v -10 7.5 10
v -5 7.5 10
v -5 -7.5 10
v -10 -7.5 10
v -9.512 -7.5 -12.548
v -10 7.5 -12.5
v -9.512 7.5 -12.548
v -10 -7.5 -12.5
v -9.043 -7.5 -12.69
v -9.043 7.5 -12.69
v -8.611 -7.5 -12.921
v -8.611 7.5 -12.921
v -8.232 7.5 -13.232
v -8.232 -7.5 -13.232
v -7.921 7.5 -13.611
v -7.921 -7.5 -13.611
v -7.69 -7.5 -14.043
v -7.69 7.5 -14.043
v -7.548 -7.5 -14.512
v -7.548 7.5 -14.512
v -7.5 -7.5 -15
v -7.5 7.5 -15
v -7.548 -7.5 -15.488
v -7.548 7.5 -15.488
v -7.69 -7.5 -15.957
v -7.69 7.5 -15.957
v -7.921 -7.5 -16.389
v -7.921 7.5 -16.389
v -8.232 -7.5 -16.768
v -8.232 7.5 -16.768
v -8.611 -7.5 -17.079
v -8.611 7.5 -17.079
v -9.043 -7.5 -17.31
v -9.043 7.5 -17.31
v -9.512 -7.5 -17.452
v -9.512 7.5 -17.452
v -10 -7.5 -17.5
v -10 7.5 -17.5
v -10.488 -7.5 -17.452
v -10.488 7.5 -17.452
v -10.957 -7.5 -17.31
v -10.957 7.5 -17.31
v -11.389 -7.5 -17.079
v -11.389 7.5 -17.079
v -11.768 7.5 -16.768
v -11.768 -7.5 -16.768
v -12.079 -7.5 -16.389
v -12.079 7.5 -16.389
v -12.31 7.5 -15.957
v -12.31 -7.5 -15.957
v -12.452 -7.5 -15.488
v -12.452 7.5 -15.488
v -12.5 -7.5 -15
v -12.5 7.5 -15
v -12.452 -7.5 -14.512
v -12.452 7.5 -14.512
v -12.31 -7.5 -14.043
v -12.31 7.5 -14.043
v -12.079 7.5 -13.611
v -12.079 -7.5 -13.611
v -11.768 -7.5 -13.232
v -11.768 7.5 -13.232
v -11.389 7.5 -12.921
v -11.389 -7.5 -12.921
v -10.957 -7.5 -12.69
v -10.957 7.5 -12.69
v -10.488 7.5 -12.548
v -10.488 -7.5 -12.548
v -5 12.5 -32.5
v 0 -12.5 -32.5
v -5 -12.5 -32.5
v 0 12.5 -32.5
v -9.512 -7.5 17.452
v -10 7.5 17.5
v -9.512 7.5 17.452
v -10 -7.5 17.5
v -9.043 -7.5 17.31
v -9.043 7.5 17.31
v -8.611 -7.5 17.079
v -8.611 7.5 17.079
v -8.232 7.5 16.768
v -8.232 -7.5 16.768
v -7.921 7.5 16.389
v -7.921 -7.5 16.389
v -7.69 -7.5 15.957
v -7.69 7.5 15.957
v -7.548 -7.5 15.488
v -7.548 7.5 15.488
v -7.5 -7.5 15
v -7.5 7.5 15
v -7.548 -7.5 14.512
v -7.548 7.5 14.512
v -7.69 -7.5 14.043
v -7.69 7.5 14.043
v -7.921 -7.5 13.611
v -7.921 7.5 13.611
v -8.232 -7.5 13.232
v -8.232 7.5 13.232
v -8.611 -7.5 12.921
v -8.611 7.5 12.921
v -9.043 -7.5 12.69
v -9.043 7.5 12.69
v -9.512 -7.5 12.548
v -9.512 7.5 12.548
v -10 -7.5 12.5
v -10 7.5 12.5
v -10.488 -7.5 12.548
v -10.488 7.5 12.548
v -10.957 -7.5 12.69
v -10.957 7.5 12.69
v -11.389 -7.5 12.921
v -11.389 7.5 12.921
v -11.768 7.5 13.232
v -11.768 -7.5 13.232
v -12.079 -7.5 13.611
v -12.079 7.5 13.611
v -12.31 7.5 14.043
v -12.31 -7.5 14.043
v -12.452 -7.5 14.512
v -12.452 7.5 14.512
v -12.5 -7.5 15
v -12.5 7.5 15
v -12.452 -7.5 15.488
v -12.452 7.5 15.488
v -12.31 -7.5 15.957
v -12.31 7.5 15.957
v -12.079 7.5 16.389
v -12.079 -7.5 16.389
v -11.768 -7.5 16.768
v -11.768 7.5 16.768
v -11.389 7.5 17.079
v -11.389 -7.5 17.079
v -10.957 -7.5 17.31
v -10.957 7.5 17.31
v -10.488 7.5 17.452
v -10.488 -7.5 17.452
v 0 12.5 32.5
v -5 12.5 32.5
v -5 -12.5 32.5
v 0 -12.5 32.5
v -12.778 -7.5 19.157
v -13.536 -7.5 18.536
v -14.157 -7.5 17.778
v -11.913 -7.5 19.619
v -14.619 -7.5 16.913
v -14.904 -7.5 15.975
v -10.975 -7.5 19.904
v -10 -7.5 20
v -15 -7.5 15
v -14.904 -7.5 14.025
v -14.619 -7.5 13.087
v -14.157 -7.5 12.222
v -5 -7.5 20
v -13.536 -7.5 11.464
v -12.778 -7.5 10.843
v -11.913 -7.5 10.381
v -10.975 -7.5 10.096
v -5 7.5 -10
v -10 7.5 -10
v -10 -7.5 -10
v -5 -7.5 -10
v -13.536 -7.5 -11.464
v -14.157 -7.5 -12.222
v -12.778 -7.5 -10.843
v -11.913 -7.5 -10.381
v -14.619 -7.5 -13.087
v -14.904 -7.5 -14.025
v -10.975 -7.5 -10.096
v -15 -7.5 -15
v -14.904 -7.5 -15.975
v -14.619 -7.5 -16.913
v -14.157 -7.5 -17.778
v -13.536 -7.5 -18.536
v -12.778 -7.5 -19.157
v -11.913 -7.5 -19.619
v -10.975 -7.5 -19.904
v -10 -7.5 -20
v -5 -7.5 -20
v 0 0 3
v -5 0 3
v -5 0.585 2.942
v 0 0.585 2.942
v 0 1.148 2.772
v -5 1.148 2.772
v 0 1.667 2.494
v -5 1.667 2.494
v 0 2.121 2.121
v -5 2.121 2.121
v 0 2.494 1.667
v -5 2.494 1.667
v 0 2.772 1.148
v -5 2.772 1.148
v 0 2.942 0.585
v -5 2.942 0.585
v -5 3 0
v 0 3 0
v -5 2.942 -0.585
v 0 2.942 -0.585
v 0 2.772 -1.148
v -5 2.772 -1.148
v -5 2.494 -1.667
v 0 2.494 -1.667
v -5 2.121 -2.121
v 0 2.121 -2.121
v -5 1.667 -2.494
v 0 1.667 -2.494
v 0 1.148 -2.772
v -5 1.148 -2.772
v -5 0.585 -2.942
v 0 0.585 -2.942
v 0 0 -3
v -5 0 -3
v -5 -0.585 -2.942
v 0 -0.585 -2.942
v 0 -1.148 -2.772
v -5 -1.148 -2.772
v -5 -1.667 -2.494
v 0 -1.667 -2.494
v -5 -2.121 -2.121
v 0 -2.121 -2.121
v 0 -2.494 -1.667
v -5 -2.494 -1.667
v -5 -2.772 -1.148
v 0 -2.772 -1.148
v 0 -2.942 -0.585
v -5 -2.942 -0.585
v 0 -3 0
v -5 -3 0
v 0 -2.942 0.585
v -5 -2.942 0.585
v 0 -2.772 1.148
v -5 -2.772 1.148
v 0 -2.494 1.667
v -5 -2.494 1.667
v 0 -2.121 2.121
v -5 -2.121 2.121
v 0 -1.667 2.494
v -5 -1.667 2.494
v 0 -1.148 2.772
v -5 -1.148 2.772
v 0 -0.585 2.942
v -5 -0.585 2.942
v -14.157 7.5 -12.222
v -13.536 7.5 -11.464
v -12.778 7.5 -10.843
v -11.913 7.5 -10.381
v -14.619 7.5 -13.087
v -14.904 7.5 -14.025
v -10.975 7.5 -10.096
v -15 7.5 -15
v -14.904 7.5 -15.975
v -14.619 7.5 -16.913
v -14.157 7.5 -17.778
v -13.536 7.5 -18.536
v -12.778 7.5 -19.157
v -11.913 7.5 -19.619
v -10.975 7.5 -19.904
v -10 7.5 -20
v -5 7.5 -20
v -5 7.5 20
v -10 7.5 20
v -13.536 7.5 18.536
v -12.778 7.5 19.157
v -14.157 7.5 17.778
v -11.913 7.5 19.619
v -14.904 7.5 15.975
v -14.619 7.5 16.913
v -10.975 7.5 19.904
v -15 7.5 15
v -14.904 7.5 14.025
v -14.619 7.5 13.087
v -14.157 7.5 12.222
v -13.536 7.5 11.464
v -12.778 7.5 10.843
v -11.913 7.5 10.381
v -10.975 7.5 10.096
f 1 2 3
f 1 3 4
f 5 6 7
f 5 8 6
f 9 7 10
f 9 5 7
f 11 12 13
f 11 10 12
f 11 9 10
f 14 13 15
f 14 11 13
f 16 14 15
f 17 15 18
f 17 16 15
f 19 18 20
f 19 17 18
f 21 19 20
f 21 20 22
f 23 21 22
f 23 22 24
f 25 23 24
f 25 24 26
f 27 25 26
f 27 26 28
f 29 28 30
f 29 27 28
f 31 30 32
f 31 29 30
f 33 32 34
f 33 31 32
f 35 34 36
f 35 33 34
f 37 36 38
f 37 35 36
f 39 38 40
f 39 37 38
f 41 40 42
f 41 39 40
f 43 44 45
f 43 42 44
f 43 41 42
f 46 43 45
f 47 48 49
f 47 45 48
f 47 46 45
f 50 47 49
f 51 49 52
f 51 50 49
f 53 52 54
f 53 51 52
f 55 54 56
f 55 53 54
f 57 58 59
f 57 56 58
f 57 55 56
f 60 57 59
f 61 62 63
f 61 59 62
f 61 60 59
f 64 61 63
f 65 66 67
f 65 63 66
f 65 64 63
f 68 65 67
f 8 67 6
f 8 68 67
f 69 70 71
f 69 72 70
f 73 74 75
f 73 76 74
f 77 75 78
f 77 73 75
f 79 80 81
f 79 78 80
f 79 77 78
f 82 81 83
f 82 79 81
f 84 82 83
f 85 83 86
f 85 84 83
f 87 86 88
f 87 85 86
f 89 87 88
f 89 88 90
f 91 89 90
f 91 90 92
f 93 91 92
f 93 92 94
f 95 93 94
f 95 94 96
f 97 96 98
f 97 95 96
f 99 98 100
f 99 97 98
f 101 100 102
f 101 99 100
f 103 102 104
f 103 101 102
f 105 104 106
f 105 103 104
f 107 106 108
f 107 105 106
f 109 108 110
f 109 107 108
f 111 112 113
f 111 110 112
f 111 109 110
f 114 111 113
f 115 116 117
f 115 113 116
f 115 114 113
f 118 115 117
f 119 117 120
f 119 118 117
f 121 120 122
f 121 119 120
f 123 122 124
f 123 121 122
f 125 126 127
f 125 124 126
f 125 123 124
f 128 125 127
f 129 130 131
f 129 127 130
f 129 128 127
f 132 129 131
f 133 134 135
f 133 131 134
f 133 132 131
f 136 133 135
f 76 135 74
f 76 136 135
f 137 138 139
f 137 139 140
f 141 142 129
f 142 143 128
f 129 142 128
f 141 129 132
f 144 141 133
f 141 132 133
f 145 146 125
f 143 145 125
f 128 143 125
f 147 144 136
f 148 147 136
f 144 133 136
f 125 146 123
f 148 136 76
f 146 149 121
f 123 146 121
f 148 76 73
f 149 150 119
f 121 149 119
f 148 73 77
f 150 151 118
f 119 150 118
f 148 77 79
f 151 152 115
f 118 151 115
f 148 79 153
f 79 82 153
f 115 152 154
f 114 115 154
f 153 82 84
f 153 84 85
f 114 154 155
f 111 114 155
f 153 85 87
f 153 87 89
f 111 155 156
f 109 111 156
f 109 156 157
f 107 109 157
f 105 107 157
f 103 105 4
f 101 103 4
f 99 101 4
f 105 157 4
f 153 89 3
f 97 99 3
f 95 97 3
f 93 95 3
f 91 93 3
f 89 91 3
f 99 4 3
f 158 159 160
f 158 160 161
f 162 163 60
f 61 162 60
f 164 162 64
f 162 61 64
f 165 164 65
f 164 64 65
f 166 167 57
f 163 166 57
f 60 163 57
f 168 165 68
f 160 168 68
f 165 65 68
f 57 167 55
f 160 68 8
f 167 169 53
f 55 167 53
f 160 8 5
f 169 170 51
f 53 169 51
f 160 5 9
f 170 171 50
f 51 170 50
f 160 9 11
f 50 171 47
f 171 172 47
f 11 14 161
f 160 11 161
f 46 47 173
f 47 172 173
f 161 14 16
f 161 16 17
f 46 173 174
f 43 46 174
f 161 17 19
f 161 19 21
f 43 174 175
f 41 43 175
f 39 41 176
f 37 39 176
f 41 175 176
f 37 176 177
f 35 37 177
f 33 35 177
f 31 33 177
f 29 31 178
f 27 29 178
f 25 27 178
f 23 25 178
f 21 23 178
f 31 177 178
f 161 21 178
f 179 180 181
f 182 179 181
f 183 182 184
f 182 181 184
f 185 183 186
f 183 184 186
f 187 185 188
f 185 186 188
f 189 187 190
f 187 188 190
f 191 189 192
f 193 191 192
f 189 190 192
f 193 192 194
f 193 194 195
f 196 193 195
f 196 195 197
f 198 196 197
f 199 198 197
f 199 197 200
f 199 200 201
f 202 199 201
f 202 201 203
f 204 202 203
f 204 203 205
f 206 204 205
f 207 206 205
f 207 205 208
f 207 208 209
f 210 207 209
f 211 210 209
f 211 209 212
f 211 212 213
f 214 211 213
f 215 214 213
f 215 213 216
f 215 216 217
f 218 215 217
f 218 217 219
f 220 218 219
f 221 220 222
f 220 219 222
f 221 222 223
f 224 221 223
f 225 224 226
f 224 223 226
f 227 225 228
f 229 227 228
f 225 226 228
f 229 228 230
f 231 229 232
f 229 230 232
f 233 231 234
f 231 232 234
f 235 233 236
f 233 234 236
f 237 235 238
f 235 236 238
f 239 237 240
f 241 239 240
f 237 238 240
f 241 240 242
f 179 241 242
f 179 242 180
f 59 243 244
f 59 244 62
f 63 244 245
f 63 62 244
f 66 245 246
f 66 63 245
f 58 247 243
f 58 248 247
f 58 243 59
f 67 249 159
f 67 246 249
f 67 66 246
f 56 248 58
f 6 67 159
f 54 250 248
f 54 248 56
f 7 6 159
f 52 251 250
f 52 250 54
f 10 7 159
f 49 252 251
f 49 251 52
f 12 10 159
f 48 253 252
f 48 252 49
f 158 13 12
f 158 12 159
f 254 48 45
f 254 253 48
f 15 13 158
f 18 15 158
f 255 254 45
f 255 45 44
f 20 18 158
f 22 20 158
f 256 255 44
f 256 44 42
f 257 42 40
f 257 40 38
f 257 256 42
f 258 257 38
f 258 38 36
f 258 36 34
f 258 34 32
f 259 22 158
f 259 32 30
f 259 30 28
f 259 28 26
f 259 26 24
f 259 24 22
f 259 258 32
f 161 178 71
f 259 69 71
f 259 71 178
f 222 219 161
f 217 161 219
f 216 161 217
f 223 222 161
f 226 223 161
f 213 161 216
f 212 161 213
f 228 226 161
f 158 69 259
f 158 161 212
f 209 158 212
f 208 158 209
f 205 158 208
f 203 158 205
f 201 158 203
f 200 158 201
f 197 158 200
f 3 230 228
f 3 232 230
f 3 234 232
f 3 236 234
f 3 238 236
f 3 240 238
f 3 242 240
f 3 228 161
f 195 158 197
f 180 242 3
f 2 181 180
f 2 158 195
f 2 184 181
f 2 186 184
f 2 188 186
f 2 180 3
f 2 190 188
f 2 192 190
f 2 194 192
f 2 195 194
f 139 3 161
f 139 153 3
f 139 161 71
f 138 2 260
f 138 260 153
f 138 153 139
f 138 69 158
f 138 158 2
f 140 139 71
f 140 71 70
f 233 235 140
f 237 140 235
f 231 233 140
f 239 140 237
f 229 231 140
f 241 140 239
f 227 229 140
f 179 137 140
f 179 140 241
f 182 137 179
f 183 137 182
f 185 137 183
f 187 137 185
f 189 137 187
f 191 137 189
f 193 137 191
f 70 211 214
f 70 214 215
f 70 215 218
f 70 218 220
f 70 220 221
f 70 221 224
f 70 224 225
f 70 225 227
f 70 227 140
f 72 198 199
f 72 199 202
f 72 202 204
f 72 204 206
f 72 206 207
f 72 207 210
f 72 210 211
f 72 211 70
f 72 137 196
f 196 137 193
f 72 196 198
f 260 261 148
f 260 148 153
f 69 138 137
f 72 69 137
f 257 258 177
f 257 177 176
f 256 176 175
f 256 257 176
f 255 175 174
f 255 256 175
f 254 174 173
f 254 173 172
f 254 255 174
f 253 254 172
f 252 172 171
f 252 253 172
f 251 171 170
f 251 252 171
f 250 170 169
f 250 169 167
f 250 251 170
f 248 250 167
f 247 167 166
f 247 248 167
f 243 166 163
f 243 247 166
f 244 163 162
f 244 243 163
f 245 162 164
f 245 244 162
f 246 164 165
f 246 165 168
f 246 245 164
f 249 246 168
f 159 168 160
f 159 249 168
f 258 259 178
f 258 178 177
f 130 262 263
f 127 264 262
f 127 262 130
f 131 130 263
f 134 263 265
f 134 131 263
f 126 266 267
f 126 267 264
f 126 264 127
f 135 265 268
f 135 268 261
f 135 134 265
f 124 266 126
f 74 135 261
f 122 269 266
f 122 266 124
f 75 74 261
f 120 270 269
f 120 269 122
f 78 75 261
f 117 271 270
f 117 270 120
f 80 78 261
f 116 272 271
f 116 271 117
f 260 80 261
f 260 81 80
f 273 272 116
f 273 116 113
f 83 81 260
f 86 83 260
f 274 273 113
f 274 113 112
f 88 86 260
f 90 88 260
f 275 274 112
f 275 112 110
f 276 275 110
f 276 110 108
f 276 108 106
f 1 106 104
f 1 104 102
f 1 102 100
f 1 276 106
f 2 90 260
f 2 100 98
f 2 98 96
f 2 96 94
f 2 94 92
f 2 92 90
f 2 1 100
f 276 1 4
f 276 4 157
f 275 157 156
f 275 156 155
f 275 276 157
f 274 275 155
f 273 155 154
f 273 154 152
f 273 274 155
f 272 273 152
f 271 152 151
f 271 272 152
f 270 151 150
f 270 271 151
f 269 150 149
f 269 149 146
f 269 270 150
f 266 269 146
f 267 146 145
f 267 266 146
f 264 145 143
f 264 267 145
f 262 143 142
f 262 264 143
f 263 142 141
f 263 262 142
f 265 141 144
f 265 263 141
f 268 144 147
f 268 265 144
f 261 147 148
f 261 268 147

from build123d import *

# Parameters (mm, degrees)
SKETCH1_R               = 2.5
BOSS_EXTRUDE1_DEPTH     = 12.5
CUT_EXTRUDE1_DEPTH      = 38.91437722
CUT_EXTRUDE1_DEPTH_BACK = 38.91437722
SKETCH2_W               = 10
SKETCH2_H               = 5
F_6_0MM_DOWEL_HOLE1_D   = 6


with BuildPart() as part:
    # Sketch1 → Boss-Extrude1 (new, symmetric)
    with BuildSketch(Plane(origin=(0, 0, 0), x_dir=(1, 0, 0), z_dir=(0, 1, 0))):
        with BuildLine():
            Line((-10, 10), (-5, 10))
            Line((-5, 10), (-5, -10))
            Line((-5, -10), (-10, -10))
            ThreePointArc((-10, -10), (-15, -15), (-10, -20))
            Line((-10, -20), (-5, -20))
            Line((-5, -20), (-5, -32.5))
            Line((-5, -32.5), (0, -32.5))
            Line((0, -32.5), (0, 32.5))
            Line((0, 32.5), (-5, 32.5))
            Line((-5, 32.5), (-5, 20))
            Line((-5, 20), (-10, 20))
            ThreePointArc((-10, 20), (-15, 15), (-10, 10))
        make_face()
        with Locations(Location((-10, 15, 0), (0, 0, 270))):
            Circle(SKETCH1_R, mode=Mode.SUBTRACT)
        with Locations(Location((-10, -15, 0), (0, 0, 270))):
            Circle(SKETCH1_R, mode=Mode.SUBTRACT)
    extrude(amount=BOSS_EXTRUDE1_DEPTH, both=True)

    # Sketch2 → Cut-Extrude1 (cut, two sides: drawn at the far end of the back side and taken through both)
    with BuildSketch(Plane.XY.offset(-CUT_EXTRUDE1_DEPTH_BACK)):
        with Locations((-10, 10)):
            Rectangle(SKETCH2_W, SKETCH2_H)
        with Locations((-10, -10)):
            Rectangle(SKETCH2_W, SKETCH2_H)
    extrude(amount=CUT_EXTRUDE1_DEPTH + CUT_EXTRUDE1_DEPTH_BACK, mode=Mode.SUBTRACT)

    # Ø6.0mm Dowel Hole1 (through all)
    with Locations(Plane(origin=(0, 0, 0), x_dir=(0, 0, -1), z_dir=(1, 0, 0))):
        with Locations((0, 0)):
            Hole(F_6_0MM_DOWEL_HOLE1_D / 2)


solid = part.part
